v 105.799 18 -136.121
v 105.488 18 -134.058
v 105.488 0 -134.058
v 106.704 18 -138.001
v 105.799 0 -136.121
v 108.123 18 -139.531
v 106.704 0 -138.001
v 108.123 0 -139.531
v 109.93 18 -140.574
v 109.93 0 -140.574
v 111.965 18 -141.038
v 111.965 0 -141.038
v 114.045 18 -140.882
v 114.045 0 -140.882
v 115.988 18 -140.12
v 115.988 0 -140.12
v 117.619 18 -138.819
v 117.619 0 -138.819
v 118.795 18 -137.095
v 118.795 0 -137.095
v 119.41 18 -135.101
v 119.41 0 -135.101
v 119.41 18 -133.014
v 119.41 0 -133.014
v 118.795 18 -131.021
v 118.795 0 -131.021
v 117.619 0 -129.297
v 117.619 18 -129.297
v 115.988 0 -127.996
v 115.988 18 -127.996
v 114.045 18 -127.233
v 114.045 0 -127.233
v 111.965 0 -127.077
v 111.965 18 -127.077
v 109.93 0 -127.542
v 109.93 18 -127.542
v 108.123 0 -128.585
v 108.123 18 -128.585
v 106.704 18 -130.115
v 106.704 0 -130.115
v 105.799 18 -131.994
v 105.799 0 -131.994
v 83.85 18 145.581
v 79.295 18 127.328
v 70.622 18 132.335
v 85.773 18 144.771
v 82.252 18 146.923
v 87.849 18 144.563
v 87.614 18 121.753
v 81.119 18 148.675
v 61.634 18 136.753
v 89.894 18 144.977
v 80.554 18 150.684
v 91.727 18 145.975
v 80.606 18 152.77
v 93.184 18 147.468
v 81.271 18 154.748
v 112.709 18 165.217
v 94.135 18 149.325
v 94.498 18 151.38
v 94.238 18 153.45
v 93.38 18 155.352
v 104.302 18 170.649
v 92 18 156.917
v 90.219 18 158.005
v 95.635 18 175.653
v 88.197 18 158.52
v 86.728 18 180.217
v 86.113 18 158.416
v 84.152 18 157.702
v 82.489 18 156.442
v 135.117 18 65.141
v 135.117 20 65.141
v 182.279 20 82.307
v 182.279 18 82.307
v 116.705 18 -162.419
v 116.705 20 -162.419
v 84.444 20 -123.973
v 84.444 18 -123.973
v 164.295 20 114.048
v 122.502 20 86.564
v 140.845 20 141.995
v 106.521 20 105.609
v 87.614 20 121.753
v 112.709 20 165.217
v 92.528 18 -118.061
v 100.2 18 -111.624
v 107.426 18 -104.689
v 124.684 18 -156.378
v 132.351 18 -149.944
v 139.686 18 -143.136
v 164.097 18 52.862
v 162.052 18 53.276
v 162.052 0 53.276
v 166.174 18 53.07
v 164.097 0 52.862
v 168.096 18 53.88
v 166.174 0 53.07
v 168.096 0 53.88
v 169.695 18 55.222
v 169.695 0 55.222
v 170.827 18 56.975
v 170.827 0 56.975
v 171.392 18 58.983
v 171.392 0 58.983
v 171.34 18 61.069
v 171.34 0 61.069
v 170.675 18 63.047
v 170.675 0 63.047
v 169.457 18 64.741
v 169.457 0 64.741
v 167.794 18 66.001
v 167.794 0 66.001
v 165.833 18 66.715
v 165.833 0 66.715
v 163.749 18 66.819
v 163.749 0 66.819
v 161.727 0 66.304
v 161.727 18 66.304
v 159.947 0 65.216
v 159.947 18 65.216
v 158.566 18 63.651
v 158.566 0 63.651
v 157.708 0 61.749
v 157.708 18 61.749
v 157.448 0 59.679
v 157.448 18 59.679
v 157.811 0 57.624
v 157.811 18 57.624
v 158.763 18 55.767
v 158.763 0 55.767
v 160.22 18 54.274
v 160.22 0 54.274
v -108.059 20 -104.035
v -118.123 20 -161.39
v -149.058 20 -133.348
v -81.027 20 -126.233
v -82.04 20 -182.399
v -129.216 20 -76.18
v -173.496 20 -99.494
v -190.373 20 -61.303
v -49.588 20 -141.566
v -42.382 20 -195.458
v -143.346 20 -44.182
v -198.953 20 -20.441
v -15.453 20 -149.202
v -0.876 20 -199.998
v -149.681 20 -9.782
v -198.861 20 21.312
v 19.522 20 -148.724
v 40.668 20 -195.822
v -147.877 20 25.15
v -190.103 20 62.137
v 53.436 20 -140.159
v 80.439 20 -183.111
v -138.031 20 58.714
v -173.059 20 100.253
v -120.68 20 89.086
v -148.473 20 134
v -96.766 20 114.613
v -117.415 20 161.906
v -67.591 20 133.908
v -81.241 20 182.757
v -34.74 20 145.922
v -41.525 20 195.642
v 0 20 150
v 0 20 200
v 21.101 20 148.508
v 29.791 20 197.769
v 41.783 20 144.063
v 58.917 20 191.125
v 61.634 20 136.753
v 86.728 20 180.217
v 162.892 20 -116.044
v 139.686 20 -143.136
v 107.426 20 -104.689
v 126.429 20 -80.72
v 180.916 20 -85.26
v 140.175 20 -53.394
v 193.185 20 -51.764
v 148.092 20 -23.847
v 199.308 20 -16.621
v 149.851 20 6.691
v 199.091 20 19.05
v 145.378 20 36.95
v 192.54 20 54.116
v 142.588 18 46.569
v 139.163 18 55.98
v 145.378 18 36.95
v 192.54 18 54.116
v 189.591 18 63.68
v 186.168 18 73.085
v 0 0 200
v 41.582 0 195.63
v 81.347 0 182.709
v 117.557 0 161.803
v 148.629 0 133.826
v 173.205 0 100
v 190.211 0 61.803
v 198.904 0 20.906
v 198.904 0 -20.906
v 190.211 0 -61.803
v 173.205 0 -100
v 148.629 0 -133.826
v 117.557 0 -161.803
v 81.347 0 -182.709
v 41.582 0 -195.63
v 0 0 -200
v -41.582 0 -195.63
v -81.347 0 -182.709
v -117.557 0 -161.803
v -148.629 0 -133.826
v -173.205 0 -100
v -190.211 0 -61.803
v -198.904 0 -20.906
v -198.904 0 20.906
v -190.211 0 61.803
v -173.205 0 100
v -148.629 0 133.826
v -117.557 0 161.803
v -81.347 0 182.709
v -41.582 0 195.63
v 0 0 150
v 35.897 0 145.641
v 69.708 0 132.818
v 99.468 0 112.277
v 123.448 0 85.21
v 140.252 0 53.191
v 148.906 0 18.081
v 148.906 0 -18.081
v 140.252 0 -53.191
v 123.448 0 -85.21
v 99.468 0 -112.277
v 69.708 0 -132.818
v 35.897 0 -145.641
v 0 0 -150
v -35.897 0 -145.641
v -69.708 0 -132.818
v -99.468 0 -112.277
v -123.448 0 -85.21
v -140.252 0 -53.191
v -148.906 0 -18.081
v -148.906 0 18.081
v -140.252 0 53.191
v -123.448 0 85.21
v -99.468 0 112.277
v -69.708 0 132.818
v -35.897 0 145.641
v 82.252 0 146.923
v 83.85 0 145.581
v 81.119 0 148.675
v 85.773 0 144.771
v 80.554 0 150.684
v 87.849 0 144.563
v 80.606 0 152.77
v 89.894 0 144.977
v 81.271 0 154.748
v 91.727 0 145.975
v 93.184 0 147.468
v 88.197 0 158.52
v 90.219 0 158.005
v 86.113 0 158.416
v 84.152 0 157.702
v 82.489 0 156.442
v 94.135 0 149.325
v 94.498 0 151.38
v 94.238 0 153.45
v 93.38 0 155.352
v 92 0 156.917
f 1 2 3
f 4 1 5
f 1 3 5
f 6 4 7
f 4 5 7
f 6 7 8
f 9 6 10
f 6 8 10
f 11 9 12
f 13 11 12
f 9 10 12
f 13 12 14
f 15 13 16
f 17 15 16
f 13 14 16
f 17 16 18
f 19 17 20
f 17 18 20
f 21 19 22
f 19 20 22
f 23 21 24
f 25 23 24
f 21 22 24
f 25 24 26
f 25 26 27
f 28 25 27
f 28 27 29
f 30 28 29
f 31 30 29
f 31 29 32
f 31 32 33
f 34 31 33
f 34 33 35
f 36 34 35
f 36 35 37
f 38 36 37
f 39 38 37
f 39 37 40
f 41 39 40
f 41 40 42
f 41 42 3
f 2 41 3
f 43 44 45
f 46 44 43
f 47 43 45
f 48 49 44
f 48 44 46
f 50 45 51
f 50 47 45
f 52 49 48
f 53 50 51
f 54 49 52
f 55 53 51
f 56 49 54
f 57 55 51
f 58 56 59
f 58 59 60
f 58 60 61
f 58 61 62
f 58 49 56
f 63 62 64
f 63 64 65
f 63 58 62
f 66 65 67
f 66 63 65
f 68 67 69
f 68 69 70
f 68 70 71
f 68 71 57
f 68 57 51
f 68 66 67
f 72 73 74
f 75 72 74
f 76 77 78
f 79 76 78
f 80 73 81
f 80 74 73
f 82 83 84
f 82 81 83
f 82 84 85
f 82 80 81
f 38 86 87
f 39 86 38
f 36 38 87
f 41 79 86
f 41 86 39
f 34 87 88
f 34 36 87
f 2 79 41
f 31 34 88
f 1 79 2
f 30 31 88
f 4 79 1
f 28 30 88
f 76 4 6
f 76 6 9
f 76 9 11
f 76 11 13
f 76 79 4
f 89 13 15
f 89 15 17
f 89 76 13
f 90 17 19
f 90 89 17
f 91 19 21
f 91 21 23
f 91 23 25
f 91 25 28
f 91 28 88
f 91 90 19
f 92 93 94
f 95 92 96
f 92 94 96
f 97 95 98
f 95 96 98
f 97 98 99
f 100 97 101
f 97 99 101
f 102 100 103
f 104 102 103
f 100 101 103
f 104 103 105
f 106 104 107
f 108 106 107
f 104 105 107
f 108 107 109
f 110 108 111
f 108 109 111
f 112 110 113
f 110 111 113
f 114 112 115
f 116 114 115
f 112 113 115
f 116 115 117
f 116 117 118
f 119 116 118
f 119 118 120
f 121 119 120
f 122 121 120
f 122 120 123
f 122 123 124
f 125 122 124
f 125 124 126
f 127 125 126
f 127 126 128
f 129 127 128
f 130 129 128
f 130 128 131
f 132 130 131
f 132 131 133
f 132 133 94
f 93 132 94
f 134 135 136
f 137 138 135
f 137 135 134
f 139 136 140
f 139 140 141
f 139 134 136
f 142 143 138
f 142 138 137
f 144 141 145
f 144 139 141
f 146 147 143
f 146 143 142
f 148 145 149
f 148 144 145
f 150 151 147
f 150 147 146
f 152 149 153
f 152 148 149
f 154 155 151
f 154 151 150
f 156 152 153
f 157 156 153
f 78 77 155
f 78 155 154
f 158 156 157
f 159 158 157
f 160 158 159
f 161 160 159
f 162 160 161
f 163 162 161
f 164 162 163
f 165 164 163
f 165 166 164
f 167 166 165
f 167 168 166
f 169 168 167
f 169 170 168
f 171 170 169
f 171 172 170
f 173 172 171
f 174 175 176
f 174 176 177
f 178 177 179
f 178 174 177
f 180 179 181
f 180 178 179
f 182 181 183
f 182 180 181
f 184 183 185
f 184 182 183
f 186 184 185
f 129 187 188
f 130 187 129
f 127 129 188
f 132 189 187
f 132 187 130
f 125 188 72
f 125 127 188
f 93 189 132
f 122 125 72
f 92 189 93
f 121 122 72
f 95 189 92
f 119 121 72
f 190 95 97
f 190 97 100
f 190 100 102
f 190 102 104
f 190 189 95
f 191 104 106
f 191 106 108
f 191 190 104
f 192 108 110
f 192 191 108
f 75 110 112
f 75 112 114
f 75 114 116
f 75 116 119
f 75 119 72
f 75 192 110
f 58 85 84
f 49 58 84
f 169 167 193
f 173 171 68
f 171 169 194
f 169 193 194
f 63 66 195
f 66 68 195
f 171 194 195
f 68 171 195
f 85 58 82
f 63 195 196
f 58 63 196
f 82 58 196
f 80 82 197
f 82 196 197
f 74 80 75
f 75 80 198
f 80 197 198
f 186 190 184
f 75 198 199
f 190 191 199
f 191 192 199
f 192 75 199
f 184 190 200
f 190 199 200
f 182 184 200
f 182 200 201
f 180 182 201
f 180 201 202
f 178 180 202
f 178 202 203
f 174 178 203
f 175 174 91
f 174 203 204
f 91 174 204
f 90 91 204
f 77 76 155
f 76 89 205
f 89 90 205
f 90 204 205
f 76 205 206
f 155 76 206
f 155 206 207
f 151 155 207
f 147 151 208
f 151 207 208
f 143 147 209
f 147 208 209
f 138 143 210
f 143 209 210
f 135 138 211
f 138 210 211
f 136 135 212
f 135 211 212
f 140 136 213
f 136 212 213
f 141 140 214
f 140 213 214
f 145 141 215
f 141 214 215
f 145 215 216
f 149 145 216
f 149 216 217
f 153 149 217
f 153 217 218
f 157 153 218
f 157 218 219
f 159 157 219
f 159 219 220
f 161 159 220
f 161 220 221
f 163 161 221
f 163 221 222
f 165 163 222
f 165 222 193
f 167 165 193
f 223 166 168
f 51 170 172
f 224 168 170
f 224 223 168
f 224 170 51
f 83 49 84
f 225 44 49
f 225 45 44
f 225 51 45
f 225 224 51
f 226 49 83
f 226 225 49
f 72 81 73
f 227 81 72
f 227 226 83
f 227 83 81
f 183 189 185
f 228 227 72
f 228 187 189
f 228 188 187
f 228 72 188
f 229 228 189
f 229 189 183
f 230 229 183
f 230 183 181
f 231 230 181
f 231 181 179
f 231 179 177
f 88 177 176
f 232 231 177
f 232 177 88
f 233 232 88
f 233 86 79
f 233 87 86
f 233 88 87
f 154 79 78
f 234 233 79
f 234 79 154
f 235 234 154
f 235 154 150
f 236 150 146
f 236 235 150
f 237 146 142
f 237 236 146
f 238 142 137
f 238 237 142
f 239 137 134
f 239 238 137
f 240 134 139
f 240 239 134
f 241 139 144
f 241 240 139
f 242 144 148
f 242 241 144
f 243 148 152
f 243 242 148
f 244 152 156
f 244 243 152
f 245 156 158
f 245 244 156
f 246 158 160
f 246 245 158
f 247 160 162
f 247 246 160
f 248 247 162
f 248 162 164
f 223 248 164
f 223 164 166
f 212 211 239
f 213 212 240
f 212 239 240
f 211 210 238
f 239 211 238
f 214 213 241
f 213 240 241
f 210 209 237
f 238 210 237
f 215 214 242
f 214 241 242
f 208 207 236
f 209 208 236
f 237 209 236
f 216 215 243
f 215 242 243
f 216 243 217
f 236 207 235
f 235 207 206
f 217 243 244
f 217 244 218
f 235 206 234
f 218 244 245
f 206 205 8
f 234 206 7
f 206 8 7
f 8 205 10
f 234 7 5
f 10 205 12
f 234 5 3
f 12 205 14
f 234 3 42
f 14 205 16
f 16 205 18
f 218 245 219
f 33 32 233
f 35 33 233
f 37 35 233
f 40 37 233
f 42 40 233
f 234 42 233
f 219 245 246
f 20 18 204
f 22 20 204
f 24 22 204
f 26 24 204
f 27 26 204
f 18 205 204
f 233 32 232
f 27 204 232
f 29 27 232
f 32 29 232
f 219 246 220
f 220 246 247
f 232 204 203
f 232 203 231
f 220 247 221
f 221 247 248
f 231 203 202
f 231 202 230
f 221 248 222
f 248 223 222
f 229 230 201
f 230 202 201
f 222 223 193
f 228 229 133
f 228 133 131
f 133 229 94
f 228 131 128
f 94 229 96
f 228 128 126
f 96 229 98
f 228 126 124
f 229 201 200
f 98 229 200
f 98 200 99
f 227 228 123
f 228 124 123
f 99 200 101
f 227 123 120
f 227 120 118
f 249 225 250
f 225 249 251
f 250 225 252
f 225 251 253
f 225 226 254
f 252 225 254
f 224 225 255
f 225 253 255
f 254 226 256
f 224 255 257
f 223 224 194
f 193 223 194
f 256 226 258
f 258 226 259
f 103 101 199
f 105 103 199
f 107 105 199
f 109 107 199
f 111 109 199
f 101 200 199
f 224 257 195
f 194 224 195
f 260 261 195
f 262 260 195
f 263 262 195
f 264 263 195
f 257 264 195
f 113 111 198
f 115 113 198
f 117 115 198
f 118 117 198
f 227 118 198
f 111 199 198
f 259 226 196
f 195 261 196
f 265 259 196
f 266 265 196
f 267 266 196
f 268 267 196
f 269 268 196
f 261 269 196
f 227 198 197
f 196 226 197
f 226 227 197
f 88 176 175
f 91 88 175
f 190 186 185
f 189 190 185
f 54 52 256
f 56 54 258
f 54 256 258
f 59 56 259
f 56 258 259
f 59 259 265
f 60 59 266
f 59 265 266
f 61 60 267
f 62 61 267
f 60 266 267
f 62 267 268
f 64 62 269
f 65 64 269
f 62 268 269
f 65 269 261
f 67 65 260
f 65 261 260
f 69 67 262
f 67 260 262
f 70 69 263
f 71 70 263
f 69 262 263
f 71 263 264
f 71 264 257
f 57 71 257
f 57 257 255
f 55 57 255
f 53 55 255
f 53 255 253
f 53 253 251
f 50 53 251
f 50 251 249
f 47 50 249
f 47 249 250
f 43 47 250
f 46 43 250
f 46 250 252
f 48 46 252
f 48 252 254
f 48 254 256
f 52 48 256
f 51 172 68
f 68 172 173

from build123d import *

# Parameters (mm, degrees)
ESQUISSE1_R                  = 200
ESQUISSE1_R_2                = 150
BOSS_EXTRU_1_DEPTH           = 20
TROU_TARAUD_M161_D           = 14
ENL_V_MAT_EXTRU_3_DEPTH      = 2
R_P_TITION_CIRCULAIRE1_COUNT = 2
R_P_TITION_CIRCULAIRE1_ANGLE = 70
R_P_TITION_CIRCULAIRE2_COUNT = 2
R_P_TITION_CIRCULAIRE2_ANGLE = 110


with BuildPart() as part:
    # Esquisse1 → Boss.-Extru.1 (new body)
    with BuildSketch(Plane(origin=(0, 0, 0), x_dir=(1, 0, 0), z_dir=(0, 1, 0))):
        with Locations(Location((0, 0, 0), (0, 0, 270))):  # turned: the seam where the file's is
            Circle(ESQUISSE1_R)
        with Locations(Location((0, 0, 0), (0, 0, 270))):  # turned: the seam where the file's is
            Circle(ESQUISSE1_R_2, mode=Mode.SUBTRACT)
    extrude(amount=BOSS_EXTRU_1_DEPTH)

    # Trou taraud_ M161 (through all)
    with Locations(Plane(origin=(0, 20, 0), x_dir=(1, 0, 0), z_dir=(0, 1, 0))):
        with Locations((112.487831695, 134.057777546)):
            trou_taraud_m161 = Hole(TROU_TARAUD_M161_D / 2)

    # Esquisse4 → Enl_v. mat.-Extru.3 (cut)
    with BuildSketch(Plane(origin=(0, 20, 0), x_dir=(1, 0, 0), z_dir=(0, 1, 0))):
        Polygon((-11.490666647, 9.641814145), (11.490666647, -9.641814145), (140.048188584, 143.567074478), (117.066855291, 162.850702769), align=None)
    enl_v_mat_extru_3 = extrude(amount=-ENL_V_MAT_EXTRU_3_DEPTH, mode=Mode.SUBTRACT)

    # R_p_tition circulaire1: Trou taraud_ M161, Enl_v. mat.-Extru.3 ×2 about axis
    r_p_tition_circulaire1_axis = Axis((0, 0, 0), (0, -1, 0))
    add([trou_taraud_m161.rotate(r_p_tition_circulaire1_axis, i * R_P_TITION_CIRCULAIRE1_ANGLE / (R_P_TITION_CIRCULAIRE1_COUNT - 1)) for i in range(1, R_P_TITION_CIRCULAIRE1_COUNT)], mode=Mode.SUBTRACT)
    add([enl_v_mat_extru_3.rotate(r_p_tition_circulaire1_axis, i * R_P_TITION_CIRCULAIRE1_ANGLE / (R_P_TITION_CIRCULAIRE1_COUNT - 1)) for i in range(1, R_P_TITION_CIRCULAIRE1_COUNT)], mode=Mode.SUBTRACT)

    # R_p_tition circulaire2: Trou taraud_ M161, Enl_v. mat.-Extru.3 ×2 about axis
    r_p_tition_circulaire2_axis = Axis((0, 0, 0), (0, -1, 0))
    add([trou_taraud_m161.rotate(r_p_tition_circulaire2_axis, i * R_P_TITION_CIRCULAIRE2_ANGLE / (R_P_TITION_CIRCULAIRE2_COUNT - 1)) for i in range(1, R_P_TITION_CIRCULAIRE2_COUNT)], mode=Mode.SUBTRACT)
    add([enl_v_mat_extru_3.rotate(r_p_tition_circulaire2_axis, i * R_P_TITION_CIRCULAIRE2_ANGLE / (R_P_TITION_CIRCULAIRE2_COUNT - 1)) for i in range(1, R_P_TITION_CIRCULAIRE2_COUNT)], mode=Mode.SUBTRACT)


solid = part.part
